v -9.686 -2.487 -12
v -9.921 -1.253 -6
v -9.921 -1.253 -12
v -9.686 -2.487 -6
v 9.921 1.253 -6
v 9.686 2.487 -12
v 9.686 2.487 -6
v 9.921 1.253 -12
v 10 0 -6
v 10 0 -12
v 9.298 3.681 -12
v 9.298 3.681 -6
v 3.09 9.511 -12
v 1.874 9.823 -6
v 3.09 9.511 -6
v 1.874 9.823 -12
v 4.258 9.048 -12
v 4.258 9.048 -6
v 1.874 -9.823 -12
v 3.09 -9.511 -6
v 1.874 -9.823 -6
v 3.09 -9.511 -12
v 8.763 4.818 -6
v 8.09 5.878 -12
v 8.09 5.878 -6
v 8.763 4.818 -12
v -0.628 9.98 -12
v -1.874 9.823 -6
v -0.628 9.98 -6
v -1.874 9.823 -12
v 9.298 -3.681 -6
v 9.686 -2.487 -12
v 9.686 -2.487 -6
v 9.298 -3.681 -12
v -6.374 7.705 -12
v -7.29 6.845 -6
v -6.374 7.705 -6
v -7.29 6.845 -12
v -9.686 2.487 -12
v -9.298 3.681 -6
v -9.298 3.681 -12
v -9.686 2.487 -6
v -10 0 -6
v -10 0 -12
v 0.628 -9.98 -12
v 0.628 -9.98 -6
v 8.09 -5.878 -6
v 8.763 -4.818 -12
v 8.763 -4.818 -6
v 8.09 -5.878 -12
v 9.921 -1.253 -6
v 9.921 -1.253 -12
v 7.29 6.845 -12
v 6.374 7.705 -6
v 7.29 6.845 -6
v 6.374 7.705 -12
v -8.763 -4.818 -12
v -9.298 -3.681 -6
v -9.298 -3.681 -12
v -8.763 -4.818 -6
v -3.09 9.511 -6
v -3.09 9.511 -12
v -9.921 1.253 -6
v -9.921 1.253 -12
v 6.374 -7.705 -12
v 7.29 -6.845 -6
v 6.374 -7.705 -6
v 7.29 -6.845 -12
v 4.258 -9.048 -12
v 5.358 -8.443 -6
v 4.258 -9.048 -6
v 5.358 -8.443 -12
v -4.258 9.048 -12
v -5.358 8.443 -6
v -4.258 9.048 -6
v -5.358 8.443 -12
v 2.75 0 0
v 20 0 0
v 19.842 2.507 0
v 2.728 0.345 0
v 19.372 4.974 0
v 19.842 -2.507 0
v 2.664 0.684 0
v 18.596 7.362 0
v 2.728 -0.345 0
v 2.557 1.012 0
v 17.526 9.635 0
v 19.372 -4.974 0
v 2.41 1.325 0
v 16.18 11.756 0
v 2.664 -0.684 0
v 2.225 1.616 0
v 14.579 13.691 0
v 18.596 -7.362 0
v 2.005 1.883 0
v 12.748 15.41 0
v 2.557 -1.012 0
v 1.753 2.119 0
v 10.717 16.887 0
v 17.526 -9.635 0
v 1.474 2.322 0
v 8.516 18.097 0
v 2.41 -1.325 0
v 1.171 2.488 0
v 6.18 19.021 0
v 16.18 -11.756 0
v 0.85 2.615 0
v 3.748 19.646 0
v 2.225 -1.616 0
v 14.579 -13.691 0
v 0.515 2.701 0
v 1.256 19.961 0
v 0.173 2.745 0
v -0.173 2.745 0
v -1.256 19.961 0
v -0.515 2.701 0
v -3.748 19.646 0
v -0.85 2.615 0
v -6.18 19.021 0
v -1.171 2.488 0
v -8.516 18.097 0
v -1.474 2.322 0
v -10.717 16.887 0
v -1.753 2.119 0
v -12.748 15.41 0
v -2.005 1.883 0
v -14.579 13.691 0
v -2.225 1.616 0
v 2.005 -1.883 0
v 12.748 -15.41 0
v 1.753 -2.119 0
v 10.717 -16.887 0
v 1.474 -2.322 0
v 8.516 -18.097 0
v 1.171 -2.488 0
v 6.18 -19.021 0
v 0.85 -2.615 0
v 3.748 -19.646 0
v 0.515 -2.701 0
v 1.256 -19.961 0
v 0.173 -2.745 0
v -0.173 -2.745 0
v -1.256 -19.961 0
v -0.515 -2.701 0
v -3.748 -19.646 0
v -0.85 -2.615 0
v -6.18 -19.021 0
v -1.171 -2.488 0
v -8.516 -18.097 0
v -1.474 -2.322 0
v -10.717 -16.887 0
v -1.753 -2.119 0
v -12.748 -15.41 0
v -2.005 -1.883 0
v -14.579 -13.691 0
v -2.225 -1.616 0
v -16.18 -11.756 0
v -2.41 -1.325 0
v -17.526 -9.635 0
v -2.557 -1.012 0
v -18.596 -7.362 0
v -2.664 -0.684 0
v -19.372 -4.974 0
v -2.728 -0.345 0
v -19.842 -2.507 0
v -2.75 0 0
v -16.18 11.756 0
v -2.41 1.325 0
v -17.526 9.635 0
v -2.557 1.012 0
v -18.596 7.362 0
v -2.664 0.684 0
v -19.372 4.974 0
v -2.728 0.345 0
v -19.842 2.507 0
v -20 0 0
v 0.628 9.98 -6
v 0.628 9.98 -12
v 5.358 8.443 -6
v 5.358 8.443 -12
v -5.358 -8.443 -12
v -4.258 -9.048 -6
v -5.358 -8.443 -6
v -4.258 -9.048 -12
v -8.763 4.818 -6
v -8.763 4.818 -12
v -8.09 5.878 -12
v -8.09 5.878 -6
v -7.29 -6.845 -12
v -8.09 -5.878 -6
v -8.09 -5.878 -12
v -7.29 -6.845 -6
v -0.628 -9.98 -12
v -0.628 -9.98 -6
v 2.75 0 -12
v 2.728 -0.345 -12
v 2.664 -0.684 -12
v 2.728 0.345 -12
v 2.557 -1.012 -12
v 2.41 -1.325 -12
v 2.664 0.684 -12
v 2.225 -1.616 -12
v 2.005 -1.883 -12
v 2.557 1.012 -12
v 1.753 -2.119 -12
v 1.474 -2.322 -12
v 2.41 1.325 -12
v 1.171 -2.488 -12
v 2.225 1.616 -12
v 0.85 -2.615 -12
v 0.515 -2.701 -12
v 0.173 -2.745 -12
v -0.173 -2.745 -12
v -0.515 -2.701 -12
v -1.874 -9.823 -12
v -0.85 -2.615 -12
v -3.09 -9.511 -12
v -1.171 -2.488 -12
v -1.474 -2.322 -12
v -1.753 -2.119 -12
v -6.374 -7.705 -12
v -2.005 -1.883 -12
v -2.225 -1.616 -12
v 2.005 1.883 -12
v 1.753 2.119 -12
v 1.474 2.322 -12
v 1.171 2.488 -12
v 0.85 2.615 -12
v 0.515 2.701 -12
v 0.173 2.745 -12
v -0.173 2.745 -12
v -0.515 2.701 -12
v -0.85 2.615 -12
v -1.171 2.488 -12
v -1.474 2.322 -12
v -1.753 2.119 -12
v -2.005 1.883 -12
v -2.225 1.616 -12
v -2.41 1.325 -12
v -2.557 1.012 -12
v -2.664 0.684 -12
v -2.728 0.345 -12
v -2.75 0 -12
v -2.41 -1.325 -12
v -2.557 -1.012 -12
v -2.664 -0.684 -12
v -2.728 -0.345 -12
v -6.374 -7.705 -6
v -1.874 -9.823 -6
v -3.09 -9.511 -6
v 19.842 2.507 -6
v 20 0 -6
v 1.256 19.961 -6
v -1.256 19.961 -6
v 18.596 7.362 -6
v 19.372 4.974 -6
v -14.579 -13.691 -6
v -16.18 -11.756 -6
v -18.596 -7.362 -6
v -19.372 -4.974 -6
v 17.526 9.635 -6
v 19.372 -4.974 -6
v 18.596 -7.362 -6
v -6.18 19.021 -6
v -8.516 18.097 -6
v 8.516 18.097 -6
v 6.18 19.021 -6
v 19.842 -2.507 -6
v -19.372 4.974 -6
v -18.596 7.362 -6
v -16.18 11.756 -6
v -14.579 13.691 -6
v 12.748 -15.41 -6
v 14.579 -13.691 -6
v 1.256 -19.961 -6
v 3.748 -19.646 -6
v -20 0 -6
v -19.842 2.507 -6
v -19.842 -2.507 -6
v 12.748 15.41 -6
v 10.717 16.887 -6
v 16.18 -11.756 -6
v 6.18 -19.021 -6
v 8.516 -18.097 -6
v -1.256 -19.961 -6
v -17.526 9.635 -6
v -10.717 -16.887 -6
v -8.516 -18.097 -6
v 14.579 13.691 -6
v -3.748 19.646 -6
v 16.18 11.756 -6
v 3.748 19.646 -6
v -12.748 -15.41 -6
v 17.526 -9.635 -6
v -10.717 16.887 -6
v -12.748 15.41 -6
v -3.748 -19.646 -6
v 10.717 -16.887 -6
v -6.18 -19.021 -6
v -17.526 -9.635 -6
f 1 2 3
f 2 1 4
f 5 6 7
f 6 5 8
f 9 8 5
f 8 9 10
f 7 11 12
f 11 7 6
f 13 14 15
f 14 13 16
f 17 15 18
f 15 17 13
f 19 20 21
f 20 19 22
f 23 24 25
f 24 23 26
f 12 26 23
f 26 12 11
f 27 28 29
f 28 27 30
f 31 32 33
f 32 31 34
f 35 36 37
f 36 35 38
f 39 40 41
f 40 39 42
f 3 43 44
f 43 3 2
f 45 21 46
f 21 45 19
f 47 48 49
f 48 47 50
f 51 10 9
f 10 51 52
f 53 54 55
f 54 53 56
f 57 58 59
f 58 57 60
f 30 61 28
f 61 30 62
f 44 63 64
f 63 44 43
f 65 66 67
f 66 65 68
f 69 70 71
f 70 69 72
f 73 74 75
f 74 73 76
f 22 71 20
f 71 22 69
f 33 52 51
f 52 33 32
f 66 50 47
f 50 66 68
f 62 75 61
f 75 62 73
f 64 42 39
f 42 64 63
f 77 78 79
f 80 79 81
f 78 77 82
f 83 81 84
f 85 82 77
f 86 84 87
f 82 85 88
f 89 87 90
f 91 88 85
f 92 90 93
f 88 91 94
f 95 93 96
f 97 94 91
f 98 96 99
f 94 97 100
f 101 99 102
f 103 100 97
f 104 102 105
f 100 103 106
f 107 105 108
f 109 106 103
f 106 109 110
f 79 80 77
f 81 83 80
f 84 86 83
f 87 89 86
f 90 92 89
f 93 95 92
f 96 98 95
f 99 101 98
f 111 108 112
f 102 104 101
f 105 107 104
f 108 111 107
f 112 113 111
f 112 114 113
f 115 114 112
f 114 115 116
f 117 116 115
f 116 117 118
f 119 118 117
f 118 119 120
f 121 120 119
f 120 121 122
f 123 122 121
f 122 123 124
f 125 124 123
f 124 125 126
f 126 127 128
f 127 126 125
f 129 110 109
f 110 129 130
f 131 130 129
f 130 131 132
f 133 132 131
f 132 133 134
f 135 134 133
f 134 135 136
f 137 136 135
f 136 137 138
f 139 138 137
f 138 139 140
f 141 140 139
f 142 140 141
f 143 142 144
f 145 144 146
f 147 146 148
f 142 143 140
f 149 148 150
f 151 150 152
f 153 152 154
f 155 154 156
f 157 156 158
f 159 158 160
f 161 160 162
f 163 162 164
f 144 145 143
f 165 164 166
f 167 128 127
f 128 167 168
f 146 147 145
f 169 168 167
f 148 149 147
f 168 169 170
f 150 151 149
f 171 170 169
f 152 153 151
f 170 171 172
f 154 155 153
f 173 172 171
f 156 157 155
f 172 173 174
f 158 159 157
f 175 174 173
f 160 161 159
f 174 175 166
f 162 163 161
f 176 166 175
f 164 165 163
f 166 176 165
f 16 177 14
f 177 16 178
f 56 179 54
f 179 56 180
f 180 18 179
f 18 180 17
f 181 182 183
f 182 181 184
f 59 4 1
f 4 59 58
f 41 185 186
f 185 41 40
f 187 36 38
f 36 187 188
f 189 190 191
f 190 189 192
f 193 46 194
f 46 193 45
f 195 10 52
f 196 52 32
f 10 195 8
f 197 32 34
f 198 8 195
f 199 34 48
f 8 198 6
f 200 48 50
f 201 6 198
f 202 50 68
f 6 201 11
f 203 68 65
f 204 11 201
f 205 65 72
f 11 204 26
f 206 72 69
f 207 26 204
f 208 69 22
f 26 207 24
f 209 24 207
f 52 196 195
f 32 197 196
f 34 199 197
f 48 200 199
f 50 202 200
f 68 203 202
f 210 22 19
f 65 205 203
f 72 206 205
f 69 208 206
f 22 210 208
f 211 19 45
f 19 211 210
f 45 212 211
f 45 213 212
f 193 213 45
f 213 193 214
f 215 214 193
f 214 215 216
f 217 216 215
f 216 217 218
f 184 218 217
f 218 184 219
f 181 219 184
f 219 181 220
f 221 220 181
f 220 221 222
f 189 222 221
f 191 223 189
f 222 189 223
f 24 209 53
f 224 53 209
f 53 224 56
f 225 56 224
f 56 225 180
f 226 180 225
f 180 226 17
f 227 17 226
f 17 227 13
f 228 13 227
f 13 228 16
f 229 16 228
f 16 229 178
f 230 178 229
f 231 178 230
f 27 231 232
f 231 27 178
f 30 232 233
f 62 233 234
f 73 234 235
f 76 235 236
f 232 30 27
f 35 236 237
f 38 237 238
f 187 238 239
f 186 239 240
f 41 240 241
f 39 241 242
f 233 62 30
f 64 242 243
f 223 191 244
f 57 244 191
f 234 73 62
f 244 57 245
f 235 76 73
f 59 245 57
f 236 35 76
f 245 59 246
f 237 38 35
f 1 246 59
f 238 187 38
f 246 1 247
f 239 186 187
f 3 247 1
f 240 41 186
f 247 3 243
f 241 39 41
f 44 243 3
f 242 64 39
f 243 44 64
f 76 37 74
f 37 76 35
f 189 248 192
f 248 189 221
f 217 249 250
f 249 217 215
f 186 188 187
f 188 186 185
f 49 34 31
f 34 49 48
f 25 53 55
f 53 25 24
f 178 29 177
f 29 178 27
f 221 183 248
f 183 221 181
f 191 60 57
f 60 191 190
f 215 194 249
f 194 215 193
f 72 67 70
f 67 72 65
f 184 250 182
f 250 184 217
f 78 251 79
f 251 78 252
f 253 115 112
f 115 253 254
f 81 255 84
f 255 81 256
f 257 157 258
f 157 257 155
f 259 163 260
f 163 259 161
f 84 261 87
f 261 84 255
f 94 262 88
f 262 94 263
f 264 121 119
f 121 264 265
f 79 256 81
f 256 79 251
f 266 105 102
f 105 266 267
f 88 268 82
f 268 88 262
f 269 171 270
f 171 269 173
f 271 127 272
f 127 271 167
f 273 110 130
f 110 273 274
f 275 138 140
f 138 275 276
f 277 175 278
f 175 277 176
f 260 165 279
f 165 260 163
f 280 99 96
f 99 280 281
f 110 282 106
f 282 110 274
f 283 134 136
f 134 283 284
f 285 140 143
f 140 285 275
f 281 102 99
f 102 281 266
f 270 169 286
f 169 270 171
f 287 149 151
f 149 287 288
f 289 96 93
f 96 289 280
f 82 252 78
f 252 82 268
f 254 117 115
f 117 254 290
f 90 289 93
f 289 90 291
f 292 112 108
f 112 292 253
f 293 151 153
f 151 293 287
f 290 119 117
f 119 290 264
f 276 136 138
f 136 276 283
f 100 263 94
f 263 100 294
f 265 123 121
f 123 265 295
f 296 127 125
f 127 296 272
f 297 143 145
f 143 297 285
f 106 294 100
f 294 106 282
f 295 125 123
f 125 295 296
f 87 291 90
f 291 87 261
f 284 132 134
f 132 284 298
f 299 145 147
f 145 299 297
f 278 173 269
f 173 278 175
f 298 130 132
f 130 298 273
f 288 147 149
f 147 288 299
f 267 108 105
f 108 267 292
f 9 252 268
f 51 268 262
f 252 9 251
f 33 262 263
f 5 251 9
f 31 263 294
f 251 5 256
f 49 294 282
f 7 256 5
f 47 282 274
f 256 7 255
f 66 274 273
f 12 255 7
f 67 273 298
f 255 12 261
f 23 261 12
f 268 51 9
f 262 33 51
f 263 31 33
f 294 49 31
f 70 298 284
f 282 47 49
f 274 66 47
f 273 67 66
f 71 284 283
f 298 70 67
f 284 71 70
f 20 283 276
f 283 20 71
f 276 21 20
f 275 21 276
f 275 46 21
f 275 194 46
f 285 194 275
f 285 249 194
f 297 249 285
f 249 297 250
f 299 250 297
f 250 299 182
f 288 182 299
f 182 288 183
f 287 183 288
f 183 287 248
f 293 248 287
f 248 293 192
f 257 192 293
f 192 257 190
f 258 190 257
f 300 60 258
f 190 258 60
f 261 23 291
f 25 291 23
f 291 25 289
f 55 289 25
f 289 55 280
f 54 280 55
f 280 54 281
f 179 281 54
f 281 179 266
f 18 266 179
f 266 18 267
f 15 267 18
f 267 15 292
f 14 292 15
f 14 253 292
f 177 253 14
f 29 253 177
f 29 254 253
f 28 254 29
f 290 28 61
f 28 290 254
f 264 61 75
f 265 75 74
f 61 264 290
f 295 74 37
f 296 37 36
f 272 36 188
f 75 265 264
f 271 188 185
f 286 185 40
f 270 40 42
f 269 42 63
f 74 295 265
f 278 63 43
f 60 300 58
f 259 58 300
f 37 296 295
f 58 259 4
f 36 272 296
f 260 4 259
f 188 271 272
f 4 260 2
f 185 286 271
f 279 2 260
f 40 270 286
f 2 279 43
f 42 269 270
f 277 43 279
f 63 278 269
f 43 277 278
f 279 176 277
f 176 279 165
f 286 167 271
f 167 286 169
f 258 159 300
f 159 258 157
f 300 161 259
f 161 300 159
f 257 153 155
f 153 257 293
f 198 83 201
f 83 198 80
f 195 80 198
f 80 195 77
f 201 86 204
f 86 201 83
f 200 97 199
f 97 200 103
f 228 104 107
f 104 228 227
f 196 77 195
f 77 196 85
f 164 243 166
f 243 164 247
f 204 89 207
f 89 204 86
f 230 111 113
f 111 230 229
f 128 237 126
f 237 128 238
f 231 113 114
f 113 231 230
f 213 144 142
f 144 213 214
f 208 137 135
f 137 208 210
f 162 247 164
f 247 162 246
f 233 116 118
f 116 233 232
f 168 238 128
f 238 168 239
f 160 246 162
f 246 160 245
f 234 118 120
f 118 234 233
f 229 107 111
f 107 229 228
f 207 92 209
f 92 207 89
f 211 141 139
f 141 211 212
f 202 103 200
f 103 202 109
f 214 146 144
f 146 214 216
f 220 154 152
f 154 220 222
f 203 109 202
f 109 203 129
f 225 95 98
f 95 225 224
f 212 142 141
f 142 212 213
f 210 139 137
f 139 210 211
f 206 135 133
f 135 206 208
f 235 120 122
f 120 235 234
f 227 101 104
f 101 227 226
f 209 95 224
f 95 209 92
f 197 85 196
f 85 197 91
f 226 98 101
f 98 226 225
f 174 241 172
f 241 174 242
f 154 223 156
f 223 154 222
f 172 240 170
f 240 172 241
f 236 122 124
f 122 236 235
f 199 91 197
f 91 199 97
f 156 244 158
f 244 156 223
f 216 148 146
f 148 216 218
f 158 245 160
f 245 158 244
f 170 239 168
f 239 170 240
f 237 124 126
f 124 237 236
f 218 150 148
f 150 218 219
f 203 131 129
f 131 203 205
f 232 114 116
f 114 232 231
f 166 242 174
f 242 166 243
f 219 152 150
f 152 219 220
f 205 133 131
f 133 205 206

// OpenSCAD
$fn = 50;


difference() {
	union() {
		translate(v = [0, 0, -12.0000000000]) {
			cylinder(h = 12, r = 10.0000000000);
		}
		translate(v = [0, 0, -6.0000000000]) {
			cylinder(h = 6, r = 20.0000000000);
		}
	}
	union() {
		#translate(v = [0, 0, -12]) {
			cylinder(h = 12, r = 2.7500000000);
		}
	}
}
